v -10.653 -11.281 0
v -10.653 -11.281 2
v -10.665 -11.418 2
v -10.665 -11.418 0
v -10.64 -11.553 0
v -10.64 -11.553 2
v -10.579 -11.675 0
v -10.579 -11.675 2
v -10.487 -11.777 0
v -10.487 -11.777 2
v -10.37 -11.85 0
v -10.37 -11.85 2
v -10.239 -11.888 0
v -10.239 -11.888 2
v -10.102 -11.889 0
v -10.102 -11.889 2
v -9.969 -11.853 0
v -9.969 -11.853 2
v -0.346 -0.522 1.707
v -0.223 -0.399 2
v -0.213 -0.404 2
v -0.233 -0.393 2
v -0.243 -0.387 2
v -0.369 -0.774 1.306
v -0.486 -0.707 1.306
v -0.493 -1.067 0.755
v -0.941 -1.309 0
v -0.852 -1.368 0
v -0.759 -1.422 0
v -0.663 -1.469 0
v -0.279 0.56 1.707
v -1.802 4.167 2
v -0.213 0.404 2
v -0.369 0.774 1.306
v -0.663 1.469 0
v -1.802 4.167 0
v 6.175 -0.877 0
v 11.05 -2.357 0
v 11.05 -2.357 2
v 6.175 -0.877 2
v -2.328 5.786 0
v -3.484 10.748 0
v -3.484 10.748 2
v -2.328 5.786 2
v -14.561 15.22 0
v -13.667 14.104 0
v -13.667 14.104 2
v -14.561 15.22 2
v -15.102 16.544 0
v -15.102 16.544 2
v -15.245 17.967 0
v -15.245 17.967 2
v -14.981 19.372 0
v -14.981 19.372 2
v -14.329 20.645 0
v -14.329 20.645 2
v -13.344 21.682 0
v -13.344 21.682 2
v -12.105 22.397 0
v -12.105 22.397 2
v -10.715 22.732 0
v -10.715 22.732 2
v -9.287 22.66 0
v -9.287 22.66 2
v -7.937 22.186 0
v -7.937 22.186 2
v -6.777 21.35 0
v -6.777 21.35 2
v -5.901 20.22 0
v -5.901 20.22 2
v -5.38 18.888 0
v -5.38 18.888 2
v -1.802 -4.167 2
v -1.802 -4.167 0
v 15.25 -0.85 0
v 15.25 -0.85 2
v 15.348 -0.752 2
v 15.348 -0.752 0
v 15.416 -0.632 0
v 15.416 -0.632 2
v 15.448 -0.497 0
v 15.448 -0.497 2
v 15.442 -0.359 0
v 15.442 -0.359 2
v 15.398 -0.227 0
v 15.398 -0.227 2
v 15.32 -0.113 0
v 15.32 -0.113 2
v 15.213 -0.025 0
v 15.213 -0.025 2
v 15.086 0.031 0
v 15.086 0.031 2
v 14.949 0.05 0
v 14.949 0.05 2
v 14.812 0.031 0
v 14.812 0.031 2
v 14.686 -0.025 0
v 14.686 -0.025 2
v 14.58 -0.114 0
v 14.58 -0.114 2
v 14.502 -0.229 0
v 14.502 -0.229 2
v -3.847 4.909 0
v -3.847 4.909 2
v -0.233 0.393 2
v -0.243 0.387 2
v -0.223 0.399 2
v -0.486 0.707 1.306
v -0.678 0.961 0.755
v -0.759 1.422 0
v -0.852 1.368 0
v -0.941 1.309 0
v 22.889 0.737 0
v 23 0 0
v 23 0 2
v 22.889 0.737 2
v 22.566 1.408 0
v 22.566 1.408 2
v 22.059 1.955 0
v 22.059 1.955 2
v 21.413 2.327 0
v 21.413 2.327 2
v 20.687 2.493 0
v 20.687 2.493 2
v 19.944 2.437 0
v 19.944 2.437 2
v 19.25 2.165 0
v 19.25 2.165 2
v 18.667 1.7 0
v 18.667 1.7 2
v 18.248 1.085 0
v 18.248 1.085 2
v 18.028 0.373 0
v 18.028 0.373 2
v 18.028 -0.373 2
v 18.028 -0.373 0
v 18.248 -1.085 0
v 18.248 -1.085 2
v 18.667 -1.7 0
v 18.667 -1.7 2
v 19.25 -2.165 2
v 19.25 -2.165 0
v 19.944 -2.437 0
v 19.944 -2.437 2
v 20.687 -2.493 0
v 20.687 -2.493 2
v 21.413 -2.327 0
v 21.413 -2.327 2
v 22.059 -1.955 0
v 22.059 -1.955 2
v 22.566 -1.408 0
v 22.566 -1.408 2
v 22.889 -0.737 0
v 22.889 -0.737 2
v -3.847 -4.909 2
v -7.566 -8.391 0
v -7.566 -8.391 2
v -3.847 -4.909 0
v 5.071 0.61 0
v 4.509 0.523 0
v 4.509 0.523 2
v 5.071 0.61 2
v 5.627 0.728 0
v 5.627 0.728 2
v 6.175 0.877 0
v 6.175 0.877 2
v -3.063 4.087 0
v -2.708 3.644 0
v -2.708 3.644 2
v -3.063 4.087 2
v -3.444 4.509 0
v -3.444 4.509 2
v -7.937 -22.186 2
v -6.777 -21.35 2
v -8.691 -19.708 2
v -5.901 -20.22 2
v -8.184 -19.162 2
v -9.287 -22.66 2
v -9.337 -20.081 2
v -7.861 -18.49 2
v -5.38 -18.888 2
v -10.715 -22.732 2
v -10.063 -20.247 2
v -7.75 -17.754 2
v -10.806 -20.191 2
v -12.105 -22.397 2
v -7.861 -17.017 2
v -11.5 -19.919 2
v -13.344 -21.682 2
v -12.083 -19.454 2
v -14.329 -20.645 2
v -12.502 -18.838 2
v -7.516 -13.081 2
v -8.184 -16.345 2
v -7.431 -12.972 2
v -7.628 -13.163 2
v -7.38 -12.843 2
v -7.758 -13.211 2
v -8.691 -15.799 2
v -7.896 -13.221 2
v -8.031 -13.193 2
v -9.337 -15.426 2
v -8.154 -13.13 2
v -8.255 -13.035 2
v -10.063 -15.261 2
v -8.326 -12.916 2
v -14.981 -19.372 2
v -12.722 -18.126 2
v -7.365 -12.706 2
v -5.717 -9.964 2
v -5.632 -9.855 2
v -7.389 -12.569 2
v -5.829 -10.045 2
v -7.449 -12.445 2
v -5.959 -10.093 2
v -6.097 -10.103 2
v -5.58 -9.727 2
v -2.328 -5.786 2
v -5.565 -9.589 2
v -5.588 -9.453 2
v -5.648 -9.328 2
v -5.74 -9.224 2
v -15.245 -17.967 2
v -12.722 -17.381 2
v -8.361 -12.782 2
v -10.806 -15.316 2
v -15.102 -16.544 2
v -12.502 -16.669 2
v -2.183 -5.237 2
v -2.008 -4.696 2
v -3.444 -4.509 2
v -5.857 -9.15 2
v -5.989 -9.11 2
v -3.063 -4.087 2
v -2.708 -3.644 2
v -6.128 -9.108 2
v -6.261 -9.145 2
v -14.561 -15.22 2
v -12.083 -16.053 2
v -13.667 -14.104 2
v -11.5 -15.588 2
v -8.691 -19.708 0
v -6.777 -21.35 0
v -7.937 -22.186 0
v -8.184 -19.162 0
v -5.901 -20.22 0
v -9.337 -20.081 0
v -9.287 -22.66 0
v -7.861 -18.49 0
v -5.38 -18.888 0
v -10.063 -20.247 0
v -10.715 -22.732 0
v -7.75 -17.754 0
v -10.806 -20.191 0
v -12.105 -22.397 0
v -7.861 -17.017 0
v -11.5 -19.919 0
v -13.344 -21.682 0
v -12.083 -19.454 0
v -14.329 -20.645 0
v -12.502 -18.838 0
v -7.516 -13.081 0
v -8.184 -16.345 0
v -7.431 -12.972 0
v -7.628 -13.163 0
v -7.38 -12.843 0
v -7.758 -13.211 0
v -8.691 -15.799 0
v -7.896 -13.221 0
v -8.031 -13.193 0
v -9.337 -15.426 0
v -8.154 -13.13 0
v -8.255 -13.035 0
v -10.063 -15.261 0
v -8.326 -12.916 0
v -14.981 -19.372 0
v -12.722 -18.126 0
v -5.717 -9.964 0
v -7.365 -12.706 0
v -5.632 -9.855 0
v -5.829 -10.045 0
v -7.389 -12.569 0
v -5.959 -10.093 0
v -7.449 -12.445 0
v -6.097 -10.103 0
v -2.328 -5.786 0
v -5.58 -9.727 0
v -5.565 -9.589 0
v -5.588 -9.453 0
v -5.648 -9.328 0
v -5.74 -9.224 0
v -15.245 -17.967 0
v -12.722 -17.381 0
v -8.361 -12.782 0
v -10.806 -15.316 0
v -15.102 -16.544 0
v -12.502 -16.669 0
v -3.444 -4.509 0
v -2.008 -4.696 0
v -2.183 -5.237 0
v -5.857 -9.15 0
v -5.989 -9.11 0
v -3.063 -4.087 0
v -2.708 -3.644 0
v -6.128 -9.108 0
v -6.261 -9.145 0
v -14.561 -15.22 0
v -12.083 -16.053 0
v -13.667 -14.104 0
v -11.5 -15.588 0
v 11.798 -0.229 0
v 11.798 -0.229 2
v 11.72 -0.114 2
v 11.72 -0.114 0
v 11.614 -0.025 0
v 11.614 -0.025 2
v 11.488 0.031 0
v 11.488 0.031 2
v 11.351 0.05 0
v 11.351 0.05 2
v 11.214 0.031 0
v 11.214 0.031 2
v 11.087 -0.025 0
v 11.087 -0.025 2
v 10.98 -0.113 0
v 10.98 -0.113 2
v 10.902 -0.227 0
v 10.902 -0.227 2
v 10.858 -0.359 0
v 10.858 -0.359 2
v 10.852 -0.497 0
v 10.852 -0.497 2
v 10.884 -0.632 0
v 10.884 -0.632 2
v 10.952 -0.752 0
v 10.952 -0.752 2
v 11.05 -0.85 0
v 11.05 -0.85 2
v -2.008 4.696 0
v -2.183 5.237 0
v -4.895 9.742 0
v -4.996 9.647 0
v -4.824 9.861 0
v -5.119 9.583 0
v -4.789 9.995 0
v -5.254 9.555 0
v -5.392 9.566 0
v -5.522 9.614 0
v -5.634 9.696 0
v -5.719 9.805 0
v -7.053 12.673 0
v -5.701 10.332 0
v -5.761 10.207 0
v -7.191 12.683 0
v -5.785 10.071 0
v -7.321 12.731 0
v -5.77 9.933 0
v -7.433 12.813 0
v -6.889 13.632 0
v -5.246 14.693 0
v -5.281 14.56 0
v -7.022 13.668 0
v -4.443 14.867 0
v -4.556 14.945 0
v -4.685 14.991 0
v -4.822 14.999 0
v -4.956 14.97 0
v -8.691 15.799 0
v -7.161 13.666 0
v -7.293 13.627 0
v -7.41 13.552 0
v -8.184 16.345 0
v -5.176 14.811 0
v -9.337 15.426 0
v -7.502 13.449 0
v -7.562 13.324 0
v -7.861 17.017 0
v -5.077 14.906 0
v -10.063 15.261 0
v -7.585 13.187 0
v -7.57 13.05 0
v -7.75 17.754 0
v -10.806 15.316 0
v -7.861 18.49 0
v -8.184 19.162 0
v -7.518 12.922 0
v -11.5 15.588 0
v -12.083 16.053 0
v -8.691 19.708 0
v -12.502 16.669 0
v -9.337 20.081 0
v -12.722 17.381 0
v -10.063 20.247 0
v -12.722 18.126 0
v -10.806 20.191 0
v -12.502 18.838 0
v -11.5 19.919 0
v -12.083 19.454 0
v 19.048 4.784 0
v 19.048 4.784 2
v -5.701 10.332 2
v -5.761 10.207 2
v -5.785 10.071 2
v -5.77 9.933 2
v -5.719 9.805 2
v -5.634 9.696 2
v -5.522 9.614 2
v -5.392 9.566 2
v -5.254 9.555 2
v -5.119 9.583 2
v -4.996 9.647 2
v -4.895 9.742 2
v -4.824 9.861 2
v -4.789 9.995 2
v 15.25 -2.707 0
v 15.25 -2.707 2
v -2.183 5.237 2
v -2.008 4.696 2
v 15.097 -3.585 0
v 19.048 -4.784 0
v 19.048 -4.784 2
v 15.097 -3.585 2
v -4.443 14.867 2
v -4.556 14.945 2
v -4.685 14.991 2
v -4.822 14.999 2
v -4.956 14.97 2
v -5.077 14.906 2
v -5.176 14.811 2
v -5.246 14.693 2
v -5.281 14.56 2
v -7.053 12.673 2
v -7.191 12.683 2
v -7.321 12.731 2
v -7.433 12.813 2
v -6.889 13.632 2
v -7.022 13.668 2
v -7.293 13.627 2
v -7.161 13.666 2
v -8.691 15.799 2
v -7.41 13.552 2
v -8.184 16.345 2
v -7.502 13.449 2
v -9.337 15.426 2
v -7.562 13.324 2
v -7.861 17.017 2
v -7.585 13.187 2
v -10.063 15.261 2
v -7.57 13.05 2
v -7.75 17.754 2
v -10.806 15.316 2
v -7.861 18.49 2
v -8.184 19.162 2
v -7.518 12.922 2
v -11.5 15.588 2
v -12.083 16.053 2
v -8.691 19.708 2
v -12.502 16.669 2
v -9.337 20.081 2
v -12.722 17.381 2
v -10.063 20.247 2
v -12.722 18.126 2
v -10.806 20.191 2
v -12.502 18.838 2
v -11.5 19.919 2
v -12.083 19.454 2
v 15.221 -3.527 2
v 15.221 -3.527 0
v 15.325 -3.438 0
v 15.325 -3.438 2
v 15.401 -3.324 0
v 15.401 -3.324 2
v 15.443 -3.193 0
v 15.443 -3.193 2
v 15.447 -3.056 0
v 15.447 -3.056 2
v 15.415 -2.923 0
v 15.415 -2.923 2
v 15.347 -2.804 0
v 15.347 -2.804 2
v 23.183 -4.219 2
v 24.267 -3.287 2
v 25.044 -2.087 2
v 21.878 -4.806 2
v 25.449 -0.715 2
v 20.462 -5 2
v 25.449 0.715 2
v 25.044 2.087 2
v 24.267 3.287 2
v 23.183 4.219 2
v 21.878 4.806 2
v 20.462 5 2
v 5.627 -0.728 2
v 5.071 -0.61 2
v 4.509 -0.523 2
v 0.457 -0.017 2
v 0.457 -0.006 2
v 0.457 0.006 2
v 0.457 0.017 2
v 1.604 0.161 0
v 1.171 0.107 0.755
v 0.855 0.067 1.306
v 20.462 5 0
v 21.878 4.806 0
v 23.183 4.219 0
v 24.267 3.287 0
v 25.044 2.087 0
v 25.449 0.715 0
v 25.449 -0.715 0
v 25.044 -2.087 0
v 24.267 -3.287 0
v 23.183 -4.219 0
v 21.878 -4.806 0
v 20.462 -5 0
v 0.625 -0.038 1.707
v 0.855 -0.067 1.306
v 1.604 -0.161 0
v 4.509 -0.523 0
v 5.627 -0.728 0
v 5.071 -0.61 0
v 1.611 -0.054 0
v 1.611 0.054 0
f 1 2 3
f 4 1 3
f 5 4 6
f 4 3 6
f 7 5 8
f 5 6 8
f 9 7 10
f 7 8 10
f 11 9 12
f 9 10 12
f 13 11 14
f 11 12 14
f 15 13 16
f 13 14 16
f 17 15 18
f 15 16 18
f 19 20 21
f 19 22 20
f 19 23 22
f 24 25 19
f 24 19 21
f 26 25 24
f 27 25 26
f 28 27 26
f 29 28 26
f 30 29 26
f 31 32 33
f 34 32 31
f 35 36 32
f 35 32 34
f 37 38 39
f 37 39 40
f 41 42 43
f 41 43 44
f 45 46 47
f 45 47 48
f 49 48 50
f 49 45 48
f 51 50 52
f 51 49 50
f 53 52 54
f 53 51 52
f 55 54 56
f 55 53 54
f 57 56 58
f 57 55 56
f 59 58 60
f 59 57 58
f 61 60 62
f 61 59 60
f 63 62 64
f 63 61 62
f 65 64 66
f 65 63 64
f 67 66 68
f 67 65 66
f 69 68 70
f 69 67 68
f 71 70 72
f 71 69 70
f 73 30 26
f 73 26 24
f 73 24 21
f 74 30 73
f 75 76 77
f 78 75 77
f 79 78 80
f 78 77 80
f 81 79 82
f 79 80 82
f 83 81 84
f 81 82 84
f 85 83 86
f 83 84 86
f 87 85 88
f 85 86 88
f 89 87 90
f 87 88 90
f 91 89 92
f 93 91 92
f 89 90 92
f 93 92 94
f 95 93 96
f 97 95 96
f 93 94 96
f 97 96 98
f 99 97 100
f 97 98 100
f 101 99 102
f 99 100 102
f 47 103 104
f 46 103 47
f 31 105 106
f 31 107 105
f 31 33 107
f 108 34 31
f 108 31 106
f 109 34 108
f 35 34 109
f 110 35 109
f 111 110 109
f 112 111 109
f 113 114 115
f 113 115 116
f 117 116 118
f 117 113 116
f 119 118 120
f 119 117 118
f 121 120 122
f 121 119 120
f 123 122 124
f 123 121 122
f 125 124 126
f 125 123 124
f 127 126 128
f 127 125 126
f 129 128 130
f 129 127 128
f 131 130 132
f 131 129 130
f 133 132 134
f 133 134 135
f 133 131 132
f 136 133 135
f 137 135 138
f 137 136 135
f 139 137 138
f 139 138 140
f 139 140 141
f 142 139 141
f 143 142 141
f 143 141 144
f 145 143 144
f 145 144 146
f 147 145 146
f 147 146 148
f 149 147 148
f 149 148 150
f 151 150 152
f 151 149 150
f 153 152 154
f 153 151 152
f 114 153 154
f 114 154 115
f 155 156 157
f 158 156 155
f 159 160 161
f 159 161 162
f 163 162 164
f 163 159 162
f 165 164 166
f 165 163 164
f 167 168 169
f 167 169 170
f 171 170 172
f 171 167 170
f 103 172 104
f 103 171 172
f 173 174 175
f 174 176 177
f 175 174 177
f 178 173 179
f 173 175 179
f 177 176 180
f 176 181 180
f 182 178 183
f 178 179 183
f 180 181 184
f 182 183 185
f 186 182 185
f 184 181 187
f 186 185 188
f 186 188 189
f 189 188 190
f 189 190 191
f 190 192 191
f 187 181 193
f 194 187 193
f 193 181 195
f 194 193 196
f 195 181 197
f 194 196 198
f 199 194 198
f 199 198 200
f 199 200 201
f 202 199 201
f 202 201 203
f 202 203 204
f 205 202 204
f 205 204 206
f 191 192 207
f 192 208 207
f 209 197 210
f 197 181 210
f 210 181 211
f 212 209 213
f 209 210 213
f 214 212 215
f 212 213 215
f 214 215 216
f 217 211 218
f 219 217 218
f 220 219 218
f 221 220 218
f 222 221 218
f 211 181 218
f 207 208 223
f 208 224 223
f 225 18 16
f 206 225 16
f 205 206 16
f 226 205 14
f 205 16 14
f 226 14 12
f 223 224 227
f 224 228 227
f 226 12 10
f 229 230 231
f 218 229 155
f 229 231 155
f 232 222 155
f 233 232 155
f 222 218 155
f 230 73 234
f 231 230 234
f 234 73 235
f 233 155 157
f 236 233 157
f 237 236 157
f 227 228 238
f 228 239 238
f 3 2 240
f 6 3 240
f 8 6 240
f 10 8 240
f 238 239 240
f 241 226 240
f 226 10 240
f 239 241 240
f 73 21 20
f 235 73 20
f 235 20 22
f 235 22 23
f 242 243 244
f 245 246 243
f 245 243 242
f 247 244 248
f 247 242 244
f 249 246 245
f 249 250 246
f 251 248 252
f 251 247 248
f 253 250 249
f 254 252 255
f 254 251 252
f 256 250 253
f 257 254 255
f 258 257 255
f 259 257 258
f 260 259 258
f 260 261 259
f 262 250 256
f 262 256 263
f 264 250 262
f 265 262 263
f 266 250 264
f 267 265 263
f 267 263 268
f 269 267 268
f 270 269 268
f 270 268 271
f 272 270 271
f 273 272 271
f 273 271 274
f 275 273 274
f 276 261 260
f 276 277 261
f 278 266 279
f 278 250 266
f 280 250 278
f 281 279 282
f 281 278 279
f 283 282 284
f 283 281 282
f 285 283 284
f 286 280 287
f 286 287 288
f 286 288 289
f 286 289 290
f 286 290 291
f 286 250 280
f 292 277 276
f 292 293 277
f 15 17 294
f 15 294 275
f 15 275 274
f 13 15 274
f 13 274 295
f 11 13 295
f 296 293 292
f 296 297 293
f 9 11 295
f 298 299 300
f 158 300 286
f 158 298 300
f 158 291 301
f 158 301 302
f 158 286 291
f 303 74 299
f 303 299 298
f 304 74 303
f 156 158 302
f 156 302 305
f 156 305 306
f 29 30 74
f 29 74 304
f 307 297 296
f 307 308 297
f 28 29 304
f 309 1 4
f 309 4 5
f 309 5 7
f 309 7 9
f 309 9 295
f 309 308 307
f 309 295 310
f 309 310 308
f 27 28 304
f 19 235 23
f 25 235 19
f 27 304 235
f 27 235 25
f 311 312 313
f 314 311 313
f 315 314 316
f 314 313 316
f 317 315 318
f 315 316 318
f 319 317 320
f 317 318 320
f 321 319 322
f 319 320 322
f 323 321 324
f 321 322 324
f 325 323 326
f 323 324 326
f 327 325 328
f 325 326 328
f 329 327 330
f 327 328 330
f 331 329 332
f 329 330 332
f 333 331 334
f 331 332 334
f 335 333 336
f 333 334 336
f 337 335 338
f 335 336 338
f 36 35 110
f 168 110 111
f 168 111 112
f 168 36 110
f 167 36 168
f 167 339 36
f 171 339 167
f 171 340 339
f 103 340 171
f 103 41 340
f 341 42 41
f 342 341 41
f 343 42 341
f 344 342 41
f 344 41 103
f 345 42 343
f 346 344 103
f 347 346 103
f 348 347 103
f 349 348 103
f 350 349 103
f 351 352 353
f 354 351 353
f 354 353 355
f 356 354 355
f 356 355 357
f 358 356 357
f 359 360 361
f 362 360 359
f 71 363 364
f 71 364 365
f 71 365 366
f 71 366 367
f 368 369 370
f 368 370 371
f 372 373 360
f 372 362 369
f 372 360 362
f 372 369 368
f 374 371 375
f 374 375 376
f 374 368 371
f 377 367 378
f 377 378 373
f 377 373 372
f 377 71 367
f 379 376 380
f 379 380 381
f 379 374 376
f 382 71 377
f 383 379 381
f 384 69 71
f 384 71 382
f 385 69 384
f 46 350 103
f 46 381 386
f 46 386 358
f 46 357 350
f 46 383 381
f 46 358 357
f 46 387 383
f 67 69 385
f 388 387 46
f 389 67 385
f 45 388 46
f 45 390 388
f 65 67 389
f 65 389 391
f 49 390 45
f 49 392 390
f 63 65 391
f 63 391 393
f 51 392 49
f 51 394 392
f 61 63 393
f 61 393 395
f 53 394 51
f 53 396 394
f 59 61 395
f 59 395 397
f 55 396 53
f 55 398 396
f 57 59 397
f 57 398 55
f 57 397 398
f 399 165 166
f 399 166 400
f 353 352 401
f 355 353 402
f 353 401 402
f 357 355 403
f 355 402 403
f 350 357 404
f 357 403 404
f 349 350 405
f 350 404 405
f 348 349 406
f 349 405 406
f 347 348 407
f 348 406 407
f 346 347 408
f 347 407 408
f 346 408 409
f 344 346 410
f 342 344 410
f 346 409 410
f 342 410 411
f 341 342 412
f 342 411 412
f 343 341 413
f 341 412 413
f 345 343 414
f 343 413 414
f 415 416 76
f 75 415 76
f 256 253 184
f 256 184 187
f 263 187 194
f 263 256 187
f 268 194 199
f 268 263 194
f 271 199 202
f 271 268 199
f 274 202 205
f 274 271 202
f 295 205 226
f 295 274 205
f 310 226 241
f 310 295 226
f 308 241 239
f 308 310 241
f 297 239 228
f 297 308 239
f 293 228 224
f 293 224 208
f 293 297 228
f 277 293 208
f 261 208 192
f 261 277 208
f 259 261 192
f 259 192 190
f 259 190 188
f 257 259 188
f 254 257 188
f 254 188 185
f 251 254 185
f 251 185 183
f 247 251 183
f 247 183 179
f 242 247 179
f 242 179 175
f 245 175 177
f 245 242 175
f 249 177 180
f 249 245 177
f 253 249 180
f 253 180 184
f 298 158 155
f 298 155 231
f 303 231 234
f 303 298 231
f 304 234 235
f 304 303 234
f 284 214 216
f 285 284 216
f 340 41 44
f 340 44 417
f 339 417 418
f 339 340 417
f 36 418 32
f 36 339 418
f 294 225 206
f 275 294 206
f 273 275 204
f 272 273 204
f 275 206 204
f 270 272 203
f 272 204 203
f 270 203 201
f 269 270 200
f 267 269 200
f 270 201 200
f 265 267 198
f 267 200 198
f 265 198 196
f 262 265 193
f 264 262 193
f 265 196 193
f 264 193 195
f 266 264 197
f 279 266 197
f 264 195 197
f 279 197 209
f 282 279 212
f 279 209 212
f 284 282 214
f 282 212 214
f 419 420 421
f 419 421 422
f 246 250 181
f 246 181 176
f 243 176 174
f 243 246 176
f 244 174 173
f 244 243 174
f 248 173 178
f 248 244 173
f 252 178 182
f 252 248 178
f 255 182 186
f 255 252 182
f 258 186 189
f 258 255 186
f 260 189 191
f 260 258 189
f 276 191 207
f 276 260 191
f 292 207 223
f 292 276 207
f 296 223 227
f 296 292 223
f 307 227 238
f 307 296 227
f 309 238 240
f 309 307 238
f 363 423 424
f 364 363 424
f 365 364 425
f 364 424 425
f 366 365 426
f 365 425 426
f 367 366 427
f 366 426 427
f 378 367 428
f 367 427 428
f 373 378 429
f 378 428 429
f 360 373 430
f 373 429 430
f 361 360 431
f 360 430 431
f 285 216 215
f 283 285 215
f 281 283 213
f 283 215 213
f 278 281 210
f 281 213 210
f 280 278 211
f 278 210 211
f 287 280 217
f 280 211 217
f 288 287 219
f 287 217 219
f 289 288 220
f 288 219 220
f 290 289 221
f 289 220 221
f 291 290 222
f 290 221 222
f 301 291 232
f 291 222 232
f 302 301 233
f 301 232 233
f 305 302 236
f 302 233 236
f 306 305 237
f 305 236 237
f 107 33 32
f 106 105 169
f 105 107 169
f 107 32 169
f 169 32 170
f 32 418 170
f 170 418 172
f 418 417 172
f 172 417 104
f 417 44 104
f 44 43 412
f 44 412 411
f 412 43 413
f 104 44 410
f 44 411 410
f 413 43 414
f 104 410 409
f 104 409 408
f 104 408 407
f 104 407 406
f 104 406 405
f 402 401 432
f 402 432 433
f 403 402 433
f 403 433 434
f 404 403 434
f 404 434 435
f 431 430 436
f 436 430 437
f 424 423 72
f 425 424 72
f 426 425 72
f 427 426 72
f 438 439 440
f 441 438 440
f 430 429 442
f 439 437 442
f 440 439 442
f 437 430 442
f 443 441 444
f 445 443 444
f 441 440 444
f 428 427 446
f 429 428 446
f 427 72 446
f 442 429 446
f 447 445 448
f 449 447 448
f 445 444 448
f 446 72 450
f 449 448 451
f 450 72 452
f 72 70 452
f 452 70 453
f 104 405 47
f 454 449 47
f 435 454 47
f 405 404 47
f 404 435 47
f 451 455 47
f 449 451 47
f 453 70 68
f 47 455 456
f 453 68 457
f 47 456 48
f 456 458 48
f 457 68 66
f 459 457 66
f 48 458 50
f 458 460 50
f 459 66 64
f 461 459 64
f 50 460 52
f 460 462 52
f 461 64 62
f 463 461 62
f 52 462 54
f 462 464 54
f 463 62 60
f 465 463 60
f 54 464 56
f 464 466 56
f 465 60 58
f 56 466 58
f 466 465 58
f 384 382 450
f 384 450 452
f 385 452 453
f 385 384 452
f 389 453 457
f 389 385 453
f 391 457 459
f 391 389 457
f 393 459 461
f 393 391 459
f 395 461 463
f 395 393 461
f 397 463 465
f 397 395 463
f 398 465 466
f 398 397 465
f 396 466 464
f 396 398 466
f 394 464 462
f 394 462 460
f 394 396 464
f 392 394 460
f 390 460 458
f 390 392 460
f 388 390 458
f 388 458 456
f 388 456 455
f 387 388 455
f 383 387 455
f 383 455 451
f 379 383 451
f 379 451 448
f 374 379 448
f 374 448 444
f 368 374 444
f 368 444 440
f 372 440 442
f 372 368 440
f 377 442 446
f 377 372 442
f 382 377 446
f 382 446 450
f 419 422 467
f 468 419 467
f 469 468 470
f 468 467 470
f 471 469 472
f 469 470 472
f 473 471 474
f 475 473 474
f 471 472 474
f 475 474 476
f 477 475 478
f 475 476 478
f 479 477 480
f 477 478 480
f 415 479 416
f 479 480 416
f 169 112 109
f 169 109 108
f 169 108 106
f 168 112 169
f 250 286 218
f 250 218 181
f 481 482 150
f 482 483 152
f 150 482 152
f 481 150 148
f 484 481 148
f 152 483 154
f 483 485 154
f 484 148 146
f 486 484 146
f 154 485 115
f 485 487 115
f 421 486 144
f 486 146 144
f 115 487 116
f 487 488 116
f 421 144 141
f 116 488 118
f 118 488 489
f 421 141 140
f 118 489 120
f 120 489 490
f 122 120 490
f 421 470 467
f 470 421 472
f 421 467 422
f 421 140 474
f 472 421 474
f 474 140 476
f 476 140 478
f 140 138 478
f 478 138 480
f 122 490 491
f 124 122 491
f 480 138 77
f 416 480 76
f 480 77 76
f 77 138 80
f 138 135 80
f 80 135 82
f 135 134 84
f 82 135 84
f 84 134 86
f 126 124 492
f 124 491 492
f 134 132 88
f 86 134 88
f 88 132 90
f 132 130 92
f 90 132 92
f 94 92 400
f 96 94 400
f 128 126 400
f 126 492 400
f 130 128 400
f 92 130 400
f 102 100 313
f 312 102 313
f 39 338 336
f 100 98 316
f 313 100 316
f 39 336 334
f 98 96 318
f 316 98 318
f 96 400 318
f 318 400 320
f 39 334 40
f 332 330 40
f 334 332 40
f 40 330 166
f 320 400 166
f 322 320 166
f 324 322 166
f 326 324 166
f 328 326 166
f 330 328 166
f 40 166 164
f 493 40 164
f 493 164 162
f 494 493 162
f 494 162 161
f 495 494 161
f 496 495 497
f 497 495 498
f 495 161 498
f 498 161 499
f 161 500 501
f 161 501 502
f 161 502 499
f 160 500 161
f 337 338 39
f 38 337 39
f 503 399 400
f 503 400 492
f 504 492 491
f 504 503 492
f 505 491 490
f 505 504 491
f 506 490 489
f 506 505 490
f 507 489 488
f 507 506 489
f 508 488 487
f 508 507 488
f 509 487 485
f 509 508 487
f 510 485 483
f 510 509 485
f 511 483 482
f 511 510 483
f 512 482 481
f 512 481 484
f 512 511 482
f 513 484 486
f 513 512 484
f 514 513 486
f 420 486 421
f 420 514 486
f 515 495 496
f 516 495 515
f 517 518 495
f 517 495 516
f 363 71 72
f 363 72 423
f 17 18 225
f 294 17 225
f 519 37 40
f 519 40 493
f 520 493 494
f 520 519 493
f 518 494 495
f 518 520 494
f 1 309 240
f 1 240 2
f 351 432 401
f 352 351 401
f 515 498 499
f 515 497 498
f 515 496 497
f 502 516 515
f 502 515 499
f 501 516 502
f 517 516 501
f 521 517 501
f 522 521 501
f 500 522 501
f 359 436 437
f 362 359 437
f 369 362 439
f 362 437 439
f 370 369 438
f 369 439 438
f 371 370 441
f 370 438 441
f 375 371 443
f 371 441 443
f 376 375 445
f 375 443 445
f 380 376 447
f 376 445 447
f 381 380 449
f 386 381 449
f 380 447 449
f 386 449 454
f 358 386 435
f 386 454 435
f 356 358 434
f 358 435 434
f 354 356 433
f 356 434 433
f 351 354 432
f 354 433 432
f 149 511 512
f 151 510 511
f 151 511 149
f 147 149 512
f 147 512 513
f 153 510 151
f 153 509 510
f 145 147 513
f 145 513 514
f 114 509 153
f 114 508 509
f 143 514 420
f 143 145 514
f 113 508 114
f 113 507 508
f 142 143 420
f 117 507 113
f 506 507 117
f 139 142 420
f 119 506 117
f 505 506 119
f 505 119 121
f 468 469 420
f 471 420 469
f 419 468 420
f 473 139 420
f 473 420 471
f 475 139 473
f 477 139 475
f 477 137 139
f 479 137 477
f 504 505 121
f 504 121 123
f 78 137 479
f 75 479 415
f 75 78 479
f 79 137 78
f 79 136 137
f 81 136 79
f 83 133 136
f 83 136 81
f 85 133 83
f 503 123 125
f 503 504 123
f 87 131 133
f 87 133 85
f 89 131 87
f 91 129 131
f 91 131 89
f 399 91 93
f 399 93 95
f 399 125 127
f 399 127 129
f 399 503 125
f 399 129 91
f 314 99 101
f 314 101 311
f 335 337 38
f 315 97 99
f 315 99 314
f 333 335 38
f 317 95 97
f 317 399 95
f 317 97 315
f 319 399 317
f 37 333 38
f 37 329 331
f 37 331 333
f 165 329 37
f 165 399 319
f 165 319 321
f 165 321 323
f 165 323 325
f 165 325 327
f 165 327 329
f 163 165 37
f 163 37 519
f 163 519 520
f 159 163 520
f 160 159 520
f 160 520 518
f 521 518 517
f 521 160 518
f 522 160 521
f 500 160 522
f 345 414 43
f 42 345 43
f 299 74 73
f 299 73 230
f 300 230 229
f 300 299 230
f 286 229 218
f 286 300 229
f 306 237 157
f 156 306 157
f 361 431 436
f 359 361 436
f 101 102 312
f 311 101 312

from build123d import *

# Parameters (mm, degrees)
SKETCH_1_R          = 2.5
EXTRUDE_1_DEPTH     = 2
EXTRUDE_1_2_DEPTH   = 2
EXTRUDE_1_3_DEPTH   = 2
CUT_EXTRUDE_1_DEPTH = 35.234086928


with BuildPart() as part:
    # 草圖1 → 填料-伸長1 (new body)
    with BuildSketch(Plane.XY):
        with BuildLine():
            Line((0.357380647, 0.004961492), (4.50941379, 0.523267787))
            ThreePointArc((4.50941379, 0.523267787), (5.349803134, 0.664770922), (6.175092484, 0.877314741))
            Line((6.175092484, 0.877314741), (19.047808057, 4.784468472))
            ThreePointArc((19.047808057, 4.784468472), (25.5, 0), (19.047808057, -4.784468472))
            Line((19.047808057, -4.784468472), (6.175092484, -0.877314741))
            ThreePointArc((6.175092484, -0.877314741), (5.349803134, -0.664770922), (4.50941379, -0.523267787))
            Line((4.50941379, -0.523267787), (0.357380647, -0.004961492))
            ThreePointArc((0.357380647, -0.004961492), (0.353, 0), (0.357380647, 0.004961492))
        make_face()
        with Locations((20.5, 0)):
            Circle(SKETCH_1_R, mode=Mode.SUBTRACT)
    extrude(amount=EXTRUDE_1_DEPTH)


with BuildPart() as body_2:
    # 草圖1 → Extrude 1 2 (new body)
    with BuildSketch(Plane.XY):
        with BuildLine():
            Line((-2.327769389, -5.786444332), (-5.380432788, -18.8881199))
            ThreePointArc((-5.380432788, -18.8881199), (-12.75, -22.083647797), (-13.667375269, -14.103651428))
            Line((-13.667375269, -14.103651428), (-3.847323094, -4.909129591))
            ThreePointArc((-3.847323094, -4.909129591), (-3.250610073, -4.300679958), (-2.707870091, -3.643633005))
            Line((-2.707870091, -3.643633005), (-0.182987102, -0.307019973))
            ThreePointArc((-0.182987102, -0.307019973), (-0.1765, -0.305706968), (-0.174393546, -0.311981465))
            Line((-0.174393546, -0.311981465), (-1.801543699, -4.166900792))
            ThreePointArc((-1.801543699, -4.166900792), (-2.09919306, -4.96545088), (-2.327769389, -5.786444332))
        make_face()
        with Locations((-10.25, -17.753520778)):
            Circle(SKETCH_1_R, mode=Mode.SUBTRACT)
    extrude(amount=EXTRUDE_1_2_DEPTH)


with BuildPart() as body_3:
    # 草圖1 → Extrude 1 3 (new body)
    with BuildSketch(Plane.XY):
        with BuildLine():
            Line((-3.847323094, 4.909129591), (-13.667375269, 14.103651428))
            ThreePointArc((-13.667375269, 14.103651428), (-12.75, 22.083647797), (-5.380432788, 18.8881199))
            Line((-5.380432788, 18.8881199), (-2.327769389, 5.786444332))
            ThreePointArc((-2.327769389, 5.786444332), (-2.09919306, 4.96545088), (-1.801543699, 4.166900792))
            Line((-1.801543699, 4.166900792), (-0.174393546, 0.311981465))
            ThreePointArc((-0.174393546, 0.311981465), (-0.1765, 0.305706968), (-0.182987102, 0.307019973))
            Line((-0.182987102, 0.307019973), (-2.707870091, 3.643633005))
            ThreePointArc((-2.707870091, 3.643633005), (-3.250610073, 4.300679958), (-3.847323094, 4.909129591))
        make_face()
        with Locations((-10.25, 17.753520778)):
            Circle(SKETCH_1_R, mode=Mode.SUBTRACT)
    extrude(amount=EXTRUDE_1_3_DEPTH)


with BuildPart() as cut_extrude_1_tool:
    # 草圖2 → 除料-伸長1 (new, through all)
    with BuildSketch(Plane.XY.offset(2)):
        with BuildLine():
            ThreePointArc((11.798296094, -0.228571429), (11.03056096, -0.065346), (11.05, -0.85))
            Line((11.05, -0.85), (11.05, -2.356956933))
            Line((11.05, -2.356956933), (15.09656548, -3.585179007))
            ThreePointArc((15.09656548, -3.585179007), (15.442536346, -3.193212295), (15.25, -2.707142857))
            Line((15.25, -2.707142857), (15.25, -0.85))
            ThreePointArc((15.25, -0.85), (15.26943904, -0.065346), (14.501703906, -0.228571429))
            Line((14.501703906, -0.228571429), (11.798296094, -0.228571429))
        make_face()
        with BuildLine():
            ThreePointArc((-6.888878407, 13.631887408), (-7.578128224, 13.25639511), (-7.052903289, 12.673129695))
            Line((-7.052903289, 12.673129695), (-5.701199383, 10.331909853))
            ThreePointArc((-5.701199383, 10.331909853), (-5.458689184, 9.585419009), (-4.788878407, 9.994580712))
            Line((-4.788878407, 9.994580712), (-3.48381542, 10.748059178))
            Line((-3.48381542, 10.748059178), (-4.443426643, 14.866598719))
            ThreePointArc((-4.443426643, 14.866598719), (-4.955865206, 14.970234922), (-5.280545514, 14.560458836))
            Line((-5.280545514, 14.560458836), (-6.888878407, 13.631887408))
        make_face()
        with BuildLine():
            ThreePointArc((-6.097096711, -10.103338424), (-5.571871776, -9.520073009), (-6.261121593, -9.144580712))
            Line((-6.261121593, -9.144580712), (-7.56618458, -8.391102245))
            Line((-7.56618458, -8.391102245), (-10.653138837, -11.281419712))
            ThreePointArc((-10.653138837, -11.281419712), (-10.48667114, -11.777022627), (-9.969454486, -11.853315979))
            Line((-9.969454486, -11.853315979), (-8.361121593, -12.781887408))
            ThreePointArc((-8.361121593, -12.781887408), (-7.691310816, -13.19104911), (-7.448800617, -12.444558267))
            Line((-7.448800617, -12.444558267), (-6.097096711, -10.103338424))
        make_face()
    extrude(amount=-CUT_EXTRUDE_1_DEPTH)


with BuildPart() as part_1:
    add(part.part)

    # 除料-伸長1: cut by cut_extrude_1_tool
    add(cut_extrude_1_tool.part, mode=Mode.SUBTRACT)


with BuildPart() as body_2_1:
    add(body_2.part)

    # 除料-伸長1: cut by cut_extrude_1_tool
    add(cut_extrude_1_tool.part, mode=Mode.SUBTRACT)


with BuildPart() as body_3_1:
    add(body_3.part)

    # 除料-伸長1: cut by cut_extrude_1_tool
    add(cut_extrude_1_tool.part, mode=Mode.SUBTRACT)


with BuildPart() as cut_revolve_1_tool:
    # 草圖3 → 除料-旋轉1 (revolve)
    with BuildSketch(Plane(origin=(0, 0, 0), x_dir=(1, 0, 0), z_dir=(0, 1, 0))):
        Polygon((0.353, -2.18), (1.611623587, 0), (0.353, 0), align=None)
    revolve(axis=Axis((0, 0, -4.245852073), (0, 0, 1)))


with BuildPart() as part_2:
    add(part_1.part)

    # 除料-旋轉1: cut by cut_revolve_1_tool
    add(cut_revolve_1_tool.part, mode=Mode.SUBTRACT)


with BuildPart() as body_2_2:
    add(body_2_1.part)

    # 除料-旋轉1: cut by cut_revolve_1_tool
    add(cut_revolve_1_tool.part, mode=Mode.SUBTRACT)


with BuildPart() as body_3_2:
    add(body_3_1.part)

    # 除料-旋轉1: cut by cut_revolve_1_tool
    add(cut_revolve_1_tool.part, mode=Mode.SUBTRACT)


solid = Compound([part_2.part, body_2_2.part, body_3_2.part])
